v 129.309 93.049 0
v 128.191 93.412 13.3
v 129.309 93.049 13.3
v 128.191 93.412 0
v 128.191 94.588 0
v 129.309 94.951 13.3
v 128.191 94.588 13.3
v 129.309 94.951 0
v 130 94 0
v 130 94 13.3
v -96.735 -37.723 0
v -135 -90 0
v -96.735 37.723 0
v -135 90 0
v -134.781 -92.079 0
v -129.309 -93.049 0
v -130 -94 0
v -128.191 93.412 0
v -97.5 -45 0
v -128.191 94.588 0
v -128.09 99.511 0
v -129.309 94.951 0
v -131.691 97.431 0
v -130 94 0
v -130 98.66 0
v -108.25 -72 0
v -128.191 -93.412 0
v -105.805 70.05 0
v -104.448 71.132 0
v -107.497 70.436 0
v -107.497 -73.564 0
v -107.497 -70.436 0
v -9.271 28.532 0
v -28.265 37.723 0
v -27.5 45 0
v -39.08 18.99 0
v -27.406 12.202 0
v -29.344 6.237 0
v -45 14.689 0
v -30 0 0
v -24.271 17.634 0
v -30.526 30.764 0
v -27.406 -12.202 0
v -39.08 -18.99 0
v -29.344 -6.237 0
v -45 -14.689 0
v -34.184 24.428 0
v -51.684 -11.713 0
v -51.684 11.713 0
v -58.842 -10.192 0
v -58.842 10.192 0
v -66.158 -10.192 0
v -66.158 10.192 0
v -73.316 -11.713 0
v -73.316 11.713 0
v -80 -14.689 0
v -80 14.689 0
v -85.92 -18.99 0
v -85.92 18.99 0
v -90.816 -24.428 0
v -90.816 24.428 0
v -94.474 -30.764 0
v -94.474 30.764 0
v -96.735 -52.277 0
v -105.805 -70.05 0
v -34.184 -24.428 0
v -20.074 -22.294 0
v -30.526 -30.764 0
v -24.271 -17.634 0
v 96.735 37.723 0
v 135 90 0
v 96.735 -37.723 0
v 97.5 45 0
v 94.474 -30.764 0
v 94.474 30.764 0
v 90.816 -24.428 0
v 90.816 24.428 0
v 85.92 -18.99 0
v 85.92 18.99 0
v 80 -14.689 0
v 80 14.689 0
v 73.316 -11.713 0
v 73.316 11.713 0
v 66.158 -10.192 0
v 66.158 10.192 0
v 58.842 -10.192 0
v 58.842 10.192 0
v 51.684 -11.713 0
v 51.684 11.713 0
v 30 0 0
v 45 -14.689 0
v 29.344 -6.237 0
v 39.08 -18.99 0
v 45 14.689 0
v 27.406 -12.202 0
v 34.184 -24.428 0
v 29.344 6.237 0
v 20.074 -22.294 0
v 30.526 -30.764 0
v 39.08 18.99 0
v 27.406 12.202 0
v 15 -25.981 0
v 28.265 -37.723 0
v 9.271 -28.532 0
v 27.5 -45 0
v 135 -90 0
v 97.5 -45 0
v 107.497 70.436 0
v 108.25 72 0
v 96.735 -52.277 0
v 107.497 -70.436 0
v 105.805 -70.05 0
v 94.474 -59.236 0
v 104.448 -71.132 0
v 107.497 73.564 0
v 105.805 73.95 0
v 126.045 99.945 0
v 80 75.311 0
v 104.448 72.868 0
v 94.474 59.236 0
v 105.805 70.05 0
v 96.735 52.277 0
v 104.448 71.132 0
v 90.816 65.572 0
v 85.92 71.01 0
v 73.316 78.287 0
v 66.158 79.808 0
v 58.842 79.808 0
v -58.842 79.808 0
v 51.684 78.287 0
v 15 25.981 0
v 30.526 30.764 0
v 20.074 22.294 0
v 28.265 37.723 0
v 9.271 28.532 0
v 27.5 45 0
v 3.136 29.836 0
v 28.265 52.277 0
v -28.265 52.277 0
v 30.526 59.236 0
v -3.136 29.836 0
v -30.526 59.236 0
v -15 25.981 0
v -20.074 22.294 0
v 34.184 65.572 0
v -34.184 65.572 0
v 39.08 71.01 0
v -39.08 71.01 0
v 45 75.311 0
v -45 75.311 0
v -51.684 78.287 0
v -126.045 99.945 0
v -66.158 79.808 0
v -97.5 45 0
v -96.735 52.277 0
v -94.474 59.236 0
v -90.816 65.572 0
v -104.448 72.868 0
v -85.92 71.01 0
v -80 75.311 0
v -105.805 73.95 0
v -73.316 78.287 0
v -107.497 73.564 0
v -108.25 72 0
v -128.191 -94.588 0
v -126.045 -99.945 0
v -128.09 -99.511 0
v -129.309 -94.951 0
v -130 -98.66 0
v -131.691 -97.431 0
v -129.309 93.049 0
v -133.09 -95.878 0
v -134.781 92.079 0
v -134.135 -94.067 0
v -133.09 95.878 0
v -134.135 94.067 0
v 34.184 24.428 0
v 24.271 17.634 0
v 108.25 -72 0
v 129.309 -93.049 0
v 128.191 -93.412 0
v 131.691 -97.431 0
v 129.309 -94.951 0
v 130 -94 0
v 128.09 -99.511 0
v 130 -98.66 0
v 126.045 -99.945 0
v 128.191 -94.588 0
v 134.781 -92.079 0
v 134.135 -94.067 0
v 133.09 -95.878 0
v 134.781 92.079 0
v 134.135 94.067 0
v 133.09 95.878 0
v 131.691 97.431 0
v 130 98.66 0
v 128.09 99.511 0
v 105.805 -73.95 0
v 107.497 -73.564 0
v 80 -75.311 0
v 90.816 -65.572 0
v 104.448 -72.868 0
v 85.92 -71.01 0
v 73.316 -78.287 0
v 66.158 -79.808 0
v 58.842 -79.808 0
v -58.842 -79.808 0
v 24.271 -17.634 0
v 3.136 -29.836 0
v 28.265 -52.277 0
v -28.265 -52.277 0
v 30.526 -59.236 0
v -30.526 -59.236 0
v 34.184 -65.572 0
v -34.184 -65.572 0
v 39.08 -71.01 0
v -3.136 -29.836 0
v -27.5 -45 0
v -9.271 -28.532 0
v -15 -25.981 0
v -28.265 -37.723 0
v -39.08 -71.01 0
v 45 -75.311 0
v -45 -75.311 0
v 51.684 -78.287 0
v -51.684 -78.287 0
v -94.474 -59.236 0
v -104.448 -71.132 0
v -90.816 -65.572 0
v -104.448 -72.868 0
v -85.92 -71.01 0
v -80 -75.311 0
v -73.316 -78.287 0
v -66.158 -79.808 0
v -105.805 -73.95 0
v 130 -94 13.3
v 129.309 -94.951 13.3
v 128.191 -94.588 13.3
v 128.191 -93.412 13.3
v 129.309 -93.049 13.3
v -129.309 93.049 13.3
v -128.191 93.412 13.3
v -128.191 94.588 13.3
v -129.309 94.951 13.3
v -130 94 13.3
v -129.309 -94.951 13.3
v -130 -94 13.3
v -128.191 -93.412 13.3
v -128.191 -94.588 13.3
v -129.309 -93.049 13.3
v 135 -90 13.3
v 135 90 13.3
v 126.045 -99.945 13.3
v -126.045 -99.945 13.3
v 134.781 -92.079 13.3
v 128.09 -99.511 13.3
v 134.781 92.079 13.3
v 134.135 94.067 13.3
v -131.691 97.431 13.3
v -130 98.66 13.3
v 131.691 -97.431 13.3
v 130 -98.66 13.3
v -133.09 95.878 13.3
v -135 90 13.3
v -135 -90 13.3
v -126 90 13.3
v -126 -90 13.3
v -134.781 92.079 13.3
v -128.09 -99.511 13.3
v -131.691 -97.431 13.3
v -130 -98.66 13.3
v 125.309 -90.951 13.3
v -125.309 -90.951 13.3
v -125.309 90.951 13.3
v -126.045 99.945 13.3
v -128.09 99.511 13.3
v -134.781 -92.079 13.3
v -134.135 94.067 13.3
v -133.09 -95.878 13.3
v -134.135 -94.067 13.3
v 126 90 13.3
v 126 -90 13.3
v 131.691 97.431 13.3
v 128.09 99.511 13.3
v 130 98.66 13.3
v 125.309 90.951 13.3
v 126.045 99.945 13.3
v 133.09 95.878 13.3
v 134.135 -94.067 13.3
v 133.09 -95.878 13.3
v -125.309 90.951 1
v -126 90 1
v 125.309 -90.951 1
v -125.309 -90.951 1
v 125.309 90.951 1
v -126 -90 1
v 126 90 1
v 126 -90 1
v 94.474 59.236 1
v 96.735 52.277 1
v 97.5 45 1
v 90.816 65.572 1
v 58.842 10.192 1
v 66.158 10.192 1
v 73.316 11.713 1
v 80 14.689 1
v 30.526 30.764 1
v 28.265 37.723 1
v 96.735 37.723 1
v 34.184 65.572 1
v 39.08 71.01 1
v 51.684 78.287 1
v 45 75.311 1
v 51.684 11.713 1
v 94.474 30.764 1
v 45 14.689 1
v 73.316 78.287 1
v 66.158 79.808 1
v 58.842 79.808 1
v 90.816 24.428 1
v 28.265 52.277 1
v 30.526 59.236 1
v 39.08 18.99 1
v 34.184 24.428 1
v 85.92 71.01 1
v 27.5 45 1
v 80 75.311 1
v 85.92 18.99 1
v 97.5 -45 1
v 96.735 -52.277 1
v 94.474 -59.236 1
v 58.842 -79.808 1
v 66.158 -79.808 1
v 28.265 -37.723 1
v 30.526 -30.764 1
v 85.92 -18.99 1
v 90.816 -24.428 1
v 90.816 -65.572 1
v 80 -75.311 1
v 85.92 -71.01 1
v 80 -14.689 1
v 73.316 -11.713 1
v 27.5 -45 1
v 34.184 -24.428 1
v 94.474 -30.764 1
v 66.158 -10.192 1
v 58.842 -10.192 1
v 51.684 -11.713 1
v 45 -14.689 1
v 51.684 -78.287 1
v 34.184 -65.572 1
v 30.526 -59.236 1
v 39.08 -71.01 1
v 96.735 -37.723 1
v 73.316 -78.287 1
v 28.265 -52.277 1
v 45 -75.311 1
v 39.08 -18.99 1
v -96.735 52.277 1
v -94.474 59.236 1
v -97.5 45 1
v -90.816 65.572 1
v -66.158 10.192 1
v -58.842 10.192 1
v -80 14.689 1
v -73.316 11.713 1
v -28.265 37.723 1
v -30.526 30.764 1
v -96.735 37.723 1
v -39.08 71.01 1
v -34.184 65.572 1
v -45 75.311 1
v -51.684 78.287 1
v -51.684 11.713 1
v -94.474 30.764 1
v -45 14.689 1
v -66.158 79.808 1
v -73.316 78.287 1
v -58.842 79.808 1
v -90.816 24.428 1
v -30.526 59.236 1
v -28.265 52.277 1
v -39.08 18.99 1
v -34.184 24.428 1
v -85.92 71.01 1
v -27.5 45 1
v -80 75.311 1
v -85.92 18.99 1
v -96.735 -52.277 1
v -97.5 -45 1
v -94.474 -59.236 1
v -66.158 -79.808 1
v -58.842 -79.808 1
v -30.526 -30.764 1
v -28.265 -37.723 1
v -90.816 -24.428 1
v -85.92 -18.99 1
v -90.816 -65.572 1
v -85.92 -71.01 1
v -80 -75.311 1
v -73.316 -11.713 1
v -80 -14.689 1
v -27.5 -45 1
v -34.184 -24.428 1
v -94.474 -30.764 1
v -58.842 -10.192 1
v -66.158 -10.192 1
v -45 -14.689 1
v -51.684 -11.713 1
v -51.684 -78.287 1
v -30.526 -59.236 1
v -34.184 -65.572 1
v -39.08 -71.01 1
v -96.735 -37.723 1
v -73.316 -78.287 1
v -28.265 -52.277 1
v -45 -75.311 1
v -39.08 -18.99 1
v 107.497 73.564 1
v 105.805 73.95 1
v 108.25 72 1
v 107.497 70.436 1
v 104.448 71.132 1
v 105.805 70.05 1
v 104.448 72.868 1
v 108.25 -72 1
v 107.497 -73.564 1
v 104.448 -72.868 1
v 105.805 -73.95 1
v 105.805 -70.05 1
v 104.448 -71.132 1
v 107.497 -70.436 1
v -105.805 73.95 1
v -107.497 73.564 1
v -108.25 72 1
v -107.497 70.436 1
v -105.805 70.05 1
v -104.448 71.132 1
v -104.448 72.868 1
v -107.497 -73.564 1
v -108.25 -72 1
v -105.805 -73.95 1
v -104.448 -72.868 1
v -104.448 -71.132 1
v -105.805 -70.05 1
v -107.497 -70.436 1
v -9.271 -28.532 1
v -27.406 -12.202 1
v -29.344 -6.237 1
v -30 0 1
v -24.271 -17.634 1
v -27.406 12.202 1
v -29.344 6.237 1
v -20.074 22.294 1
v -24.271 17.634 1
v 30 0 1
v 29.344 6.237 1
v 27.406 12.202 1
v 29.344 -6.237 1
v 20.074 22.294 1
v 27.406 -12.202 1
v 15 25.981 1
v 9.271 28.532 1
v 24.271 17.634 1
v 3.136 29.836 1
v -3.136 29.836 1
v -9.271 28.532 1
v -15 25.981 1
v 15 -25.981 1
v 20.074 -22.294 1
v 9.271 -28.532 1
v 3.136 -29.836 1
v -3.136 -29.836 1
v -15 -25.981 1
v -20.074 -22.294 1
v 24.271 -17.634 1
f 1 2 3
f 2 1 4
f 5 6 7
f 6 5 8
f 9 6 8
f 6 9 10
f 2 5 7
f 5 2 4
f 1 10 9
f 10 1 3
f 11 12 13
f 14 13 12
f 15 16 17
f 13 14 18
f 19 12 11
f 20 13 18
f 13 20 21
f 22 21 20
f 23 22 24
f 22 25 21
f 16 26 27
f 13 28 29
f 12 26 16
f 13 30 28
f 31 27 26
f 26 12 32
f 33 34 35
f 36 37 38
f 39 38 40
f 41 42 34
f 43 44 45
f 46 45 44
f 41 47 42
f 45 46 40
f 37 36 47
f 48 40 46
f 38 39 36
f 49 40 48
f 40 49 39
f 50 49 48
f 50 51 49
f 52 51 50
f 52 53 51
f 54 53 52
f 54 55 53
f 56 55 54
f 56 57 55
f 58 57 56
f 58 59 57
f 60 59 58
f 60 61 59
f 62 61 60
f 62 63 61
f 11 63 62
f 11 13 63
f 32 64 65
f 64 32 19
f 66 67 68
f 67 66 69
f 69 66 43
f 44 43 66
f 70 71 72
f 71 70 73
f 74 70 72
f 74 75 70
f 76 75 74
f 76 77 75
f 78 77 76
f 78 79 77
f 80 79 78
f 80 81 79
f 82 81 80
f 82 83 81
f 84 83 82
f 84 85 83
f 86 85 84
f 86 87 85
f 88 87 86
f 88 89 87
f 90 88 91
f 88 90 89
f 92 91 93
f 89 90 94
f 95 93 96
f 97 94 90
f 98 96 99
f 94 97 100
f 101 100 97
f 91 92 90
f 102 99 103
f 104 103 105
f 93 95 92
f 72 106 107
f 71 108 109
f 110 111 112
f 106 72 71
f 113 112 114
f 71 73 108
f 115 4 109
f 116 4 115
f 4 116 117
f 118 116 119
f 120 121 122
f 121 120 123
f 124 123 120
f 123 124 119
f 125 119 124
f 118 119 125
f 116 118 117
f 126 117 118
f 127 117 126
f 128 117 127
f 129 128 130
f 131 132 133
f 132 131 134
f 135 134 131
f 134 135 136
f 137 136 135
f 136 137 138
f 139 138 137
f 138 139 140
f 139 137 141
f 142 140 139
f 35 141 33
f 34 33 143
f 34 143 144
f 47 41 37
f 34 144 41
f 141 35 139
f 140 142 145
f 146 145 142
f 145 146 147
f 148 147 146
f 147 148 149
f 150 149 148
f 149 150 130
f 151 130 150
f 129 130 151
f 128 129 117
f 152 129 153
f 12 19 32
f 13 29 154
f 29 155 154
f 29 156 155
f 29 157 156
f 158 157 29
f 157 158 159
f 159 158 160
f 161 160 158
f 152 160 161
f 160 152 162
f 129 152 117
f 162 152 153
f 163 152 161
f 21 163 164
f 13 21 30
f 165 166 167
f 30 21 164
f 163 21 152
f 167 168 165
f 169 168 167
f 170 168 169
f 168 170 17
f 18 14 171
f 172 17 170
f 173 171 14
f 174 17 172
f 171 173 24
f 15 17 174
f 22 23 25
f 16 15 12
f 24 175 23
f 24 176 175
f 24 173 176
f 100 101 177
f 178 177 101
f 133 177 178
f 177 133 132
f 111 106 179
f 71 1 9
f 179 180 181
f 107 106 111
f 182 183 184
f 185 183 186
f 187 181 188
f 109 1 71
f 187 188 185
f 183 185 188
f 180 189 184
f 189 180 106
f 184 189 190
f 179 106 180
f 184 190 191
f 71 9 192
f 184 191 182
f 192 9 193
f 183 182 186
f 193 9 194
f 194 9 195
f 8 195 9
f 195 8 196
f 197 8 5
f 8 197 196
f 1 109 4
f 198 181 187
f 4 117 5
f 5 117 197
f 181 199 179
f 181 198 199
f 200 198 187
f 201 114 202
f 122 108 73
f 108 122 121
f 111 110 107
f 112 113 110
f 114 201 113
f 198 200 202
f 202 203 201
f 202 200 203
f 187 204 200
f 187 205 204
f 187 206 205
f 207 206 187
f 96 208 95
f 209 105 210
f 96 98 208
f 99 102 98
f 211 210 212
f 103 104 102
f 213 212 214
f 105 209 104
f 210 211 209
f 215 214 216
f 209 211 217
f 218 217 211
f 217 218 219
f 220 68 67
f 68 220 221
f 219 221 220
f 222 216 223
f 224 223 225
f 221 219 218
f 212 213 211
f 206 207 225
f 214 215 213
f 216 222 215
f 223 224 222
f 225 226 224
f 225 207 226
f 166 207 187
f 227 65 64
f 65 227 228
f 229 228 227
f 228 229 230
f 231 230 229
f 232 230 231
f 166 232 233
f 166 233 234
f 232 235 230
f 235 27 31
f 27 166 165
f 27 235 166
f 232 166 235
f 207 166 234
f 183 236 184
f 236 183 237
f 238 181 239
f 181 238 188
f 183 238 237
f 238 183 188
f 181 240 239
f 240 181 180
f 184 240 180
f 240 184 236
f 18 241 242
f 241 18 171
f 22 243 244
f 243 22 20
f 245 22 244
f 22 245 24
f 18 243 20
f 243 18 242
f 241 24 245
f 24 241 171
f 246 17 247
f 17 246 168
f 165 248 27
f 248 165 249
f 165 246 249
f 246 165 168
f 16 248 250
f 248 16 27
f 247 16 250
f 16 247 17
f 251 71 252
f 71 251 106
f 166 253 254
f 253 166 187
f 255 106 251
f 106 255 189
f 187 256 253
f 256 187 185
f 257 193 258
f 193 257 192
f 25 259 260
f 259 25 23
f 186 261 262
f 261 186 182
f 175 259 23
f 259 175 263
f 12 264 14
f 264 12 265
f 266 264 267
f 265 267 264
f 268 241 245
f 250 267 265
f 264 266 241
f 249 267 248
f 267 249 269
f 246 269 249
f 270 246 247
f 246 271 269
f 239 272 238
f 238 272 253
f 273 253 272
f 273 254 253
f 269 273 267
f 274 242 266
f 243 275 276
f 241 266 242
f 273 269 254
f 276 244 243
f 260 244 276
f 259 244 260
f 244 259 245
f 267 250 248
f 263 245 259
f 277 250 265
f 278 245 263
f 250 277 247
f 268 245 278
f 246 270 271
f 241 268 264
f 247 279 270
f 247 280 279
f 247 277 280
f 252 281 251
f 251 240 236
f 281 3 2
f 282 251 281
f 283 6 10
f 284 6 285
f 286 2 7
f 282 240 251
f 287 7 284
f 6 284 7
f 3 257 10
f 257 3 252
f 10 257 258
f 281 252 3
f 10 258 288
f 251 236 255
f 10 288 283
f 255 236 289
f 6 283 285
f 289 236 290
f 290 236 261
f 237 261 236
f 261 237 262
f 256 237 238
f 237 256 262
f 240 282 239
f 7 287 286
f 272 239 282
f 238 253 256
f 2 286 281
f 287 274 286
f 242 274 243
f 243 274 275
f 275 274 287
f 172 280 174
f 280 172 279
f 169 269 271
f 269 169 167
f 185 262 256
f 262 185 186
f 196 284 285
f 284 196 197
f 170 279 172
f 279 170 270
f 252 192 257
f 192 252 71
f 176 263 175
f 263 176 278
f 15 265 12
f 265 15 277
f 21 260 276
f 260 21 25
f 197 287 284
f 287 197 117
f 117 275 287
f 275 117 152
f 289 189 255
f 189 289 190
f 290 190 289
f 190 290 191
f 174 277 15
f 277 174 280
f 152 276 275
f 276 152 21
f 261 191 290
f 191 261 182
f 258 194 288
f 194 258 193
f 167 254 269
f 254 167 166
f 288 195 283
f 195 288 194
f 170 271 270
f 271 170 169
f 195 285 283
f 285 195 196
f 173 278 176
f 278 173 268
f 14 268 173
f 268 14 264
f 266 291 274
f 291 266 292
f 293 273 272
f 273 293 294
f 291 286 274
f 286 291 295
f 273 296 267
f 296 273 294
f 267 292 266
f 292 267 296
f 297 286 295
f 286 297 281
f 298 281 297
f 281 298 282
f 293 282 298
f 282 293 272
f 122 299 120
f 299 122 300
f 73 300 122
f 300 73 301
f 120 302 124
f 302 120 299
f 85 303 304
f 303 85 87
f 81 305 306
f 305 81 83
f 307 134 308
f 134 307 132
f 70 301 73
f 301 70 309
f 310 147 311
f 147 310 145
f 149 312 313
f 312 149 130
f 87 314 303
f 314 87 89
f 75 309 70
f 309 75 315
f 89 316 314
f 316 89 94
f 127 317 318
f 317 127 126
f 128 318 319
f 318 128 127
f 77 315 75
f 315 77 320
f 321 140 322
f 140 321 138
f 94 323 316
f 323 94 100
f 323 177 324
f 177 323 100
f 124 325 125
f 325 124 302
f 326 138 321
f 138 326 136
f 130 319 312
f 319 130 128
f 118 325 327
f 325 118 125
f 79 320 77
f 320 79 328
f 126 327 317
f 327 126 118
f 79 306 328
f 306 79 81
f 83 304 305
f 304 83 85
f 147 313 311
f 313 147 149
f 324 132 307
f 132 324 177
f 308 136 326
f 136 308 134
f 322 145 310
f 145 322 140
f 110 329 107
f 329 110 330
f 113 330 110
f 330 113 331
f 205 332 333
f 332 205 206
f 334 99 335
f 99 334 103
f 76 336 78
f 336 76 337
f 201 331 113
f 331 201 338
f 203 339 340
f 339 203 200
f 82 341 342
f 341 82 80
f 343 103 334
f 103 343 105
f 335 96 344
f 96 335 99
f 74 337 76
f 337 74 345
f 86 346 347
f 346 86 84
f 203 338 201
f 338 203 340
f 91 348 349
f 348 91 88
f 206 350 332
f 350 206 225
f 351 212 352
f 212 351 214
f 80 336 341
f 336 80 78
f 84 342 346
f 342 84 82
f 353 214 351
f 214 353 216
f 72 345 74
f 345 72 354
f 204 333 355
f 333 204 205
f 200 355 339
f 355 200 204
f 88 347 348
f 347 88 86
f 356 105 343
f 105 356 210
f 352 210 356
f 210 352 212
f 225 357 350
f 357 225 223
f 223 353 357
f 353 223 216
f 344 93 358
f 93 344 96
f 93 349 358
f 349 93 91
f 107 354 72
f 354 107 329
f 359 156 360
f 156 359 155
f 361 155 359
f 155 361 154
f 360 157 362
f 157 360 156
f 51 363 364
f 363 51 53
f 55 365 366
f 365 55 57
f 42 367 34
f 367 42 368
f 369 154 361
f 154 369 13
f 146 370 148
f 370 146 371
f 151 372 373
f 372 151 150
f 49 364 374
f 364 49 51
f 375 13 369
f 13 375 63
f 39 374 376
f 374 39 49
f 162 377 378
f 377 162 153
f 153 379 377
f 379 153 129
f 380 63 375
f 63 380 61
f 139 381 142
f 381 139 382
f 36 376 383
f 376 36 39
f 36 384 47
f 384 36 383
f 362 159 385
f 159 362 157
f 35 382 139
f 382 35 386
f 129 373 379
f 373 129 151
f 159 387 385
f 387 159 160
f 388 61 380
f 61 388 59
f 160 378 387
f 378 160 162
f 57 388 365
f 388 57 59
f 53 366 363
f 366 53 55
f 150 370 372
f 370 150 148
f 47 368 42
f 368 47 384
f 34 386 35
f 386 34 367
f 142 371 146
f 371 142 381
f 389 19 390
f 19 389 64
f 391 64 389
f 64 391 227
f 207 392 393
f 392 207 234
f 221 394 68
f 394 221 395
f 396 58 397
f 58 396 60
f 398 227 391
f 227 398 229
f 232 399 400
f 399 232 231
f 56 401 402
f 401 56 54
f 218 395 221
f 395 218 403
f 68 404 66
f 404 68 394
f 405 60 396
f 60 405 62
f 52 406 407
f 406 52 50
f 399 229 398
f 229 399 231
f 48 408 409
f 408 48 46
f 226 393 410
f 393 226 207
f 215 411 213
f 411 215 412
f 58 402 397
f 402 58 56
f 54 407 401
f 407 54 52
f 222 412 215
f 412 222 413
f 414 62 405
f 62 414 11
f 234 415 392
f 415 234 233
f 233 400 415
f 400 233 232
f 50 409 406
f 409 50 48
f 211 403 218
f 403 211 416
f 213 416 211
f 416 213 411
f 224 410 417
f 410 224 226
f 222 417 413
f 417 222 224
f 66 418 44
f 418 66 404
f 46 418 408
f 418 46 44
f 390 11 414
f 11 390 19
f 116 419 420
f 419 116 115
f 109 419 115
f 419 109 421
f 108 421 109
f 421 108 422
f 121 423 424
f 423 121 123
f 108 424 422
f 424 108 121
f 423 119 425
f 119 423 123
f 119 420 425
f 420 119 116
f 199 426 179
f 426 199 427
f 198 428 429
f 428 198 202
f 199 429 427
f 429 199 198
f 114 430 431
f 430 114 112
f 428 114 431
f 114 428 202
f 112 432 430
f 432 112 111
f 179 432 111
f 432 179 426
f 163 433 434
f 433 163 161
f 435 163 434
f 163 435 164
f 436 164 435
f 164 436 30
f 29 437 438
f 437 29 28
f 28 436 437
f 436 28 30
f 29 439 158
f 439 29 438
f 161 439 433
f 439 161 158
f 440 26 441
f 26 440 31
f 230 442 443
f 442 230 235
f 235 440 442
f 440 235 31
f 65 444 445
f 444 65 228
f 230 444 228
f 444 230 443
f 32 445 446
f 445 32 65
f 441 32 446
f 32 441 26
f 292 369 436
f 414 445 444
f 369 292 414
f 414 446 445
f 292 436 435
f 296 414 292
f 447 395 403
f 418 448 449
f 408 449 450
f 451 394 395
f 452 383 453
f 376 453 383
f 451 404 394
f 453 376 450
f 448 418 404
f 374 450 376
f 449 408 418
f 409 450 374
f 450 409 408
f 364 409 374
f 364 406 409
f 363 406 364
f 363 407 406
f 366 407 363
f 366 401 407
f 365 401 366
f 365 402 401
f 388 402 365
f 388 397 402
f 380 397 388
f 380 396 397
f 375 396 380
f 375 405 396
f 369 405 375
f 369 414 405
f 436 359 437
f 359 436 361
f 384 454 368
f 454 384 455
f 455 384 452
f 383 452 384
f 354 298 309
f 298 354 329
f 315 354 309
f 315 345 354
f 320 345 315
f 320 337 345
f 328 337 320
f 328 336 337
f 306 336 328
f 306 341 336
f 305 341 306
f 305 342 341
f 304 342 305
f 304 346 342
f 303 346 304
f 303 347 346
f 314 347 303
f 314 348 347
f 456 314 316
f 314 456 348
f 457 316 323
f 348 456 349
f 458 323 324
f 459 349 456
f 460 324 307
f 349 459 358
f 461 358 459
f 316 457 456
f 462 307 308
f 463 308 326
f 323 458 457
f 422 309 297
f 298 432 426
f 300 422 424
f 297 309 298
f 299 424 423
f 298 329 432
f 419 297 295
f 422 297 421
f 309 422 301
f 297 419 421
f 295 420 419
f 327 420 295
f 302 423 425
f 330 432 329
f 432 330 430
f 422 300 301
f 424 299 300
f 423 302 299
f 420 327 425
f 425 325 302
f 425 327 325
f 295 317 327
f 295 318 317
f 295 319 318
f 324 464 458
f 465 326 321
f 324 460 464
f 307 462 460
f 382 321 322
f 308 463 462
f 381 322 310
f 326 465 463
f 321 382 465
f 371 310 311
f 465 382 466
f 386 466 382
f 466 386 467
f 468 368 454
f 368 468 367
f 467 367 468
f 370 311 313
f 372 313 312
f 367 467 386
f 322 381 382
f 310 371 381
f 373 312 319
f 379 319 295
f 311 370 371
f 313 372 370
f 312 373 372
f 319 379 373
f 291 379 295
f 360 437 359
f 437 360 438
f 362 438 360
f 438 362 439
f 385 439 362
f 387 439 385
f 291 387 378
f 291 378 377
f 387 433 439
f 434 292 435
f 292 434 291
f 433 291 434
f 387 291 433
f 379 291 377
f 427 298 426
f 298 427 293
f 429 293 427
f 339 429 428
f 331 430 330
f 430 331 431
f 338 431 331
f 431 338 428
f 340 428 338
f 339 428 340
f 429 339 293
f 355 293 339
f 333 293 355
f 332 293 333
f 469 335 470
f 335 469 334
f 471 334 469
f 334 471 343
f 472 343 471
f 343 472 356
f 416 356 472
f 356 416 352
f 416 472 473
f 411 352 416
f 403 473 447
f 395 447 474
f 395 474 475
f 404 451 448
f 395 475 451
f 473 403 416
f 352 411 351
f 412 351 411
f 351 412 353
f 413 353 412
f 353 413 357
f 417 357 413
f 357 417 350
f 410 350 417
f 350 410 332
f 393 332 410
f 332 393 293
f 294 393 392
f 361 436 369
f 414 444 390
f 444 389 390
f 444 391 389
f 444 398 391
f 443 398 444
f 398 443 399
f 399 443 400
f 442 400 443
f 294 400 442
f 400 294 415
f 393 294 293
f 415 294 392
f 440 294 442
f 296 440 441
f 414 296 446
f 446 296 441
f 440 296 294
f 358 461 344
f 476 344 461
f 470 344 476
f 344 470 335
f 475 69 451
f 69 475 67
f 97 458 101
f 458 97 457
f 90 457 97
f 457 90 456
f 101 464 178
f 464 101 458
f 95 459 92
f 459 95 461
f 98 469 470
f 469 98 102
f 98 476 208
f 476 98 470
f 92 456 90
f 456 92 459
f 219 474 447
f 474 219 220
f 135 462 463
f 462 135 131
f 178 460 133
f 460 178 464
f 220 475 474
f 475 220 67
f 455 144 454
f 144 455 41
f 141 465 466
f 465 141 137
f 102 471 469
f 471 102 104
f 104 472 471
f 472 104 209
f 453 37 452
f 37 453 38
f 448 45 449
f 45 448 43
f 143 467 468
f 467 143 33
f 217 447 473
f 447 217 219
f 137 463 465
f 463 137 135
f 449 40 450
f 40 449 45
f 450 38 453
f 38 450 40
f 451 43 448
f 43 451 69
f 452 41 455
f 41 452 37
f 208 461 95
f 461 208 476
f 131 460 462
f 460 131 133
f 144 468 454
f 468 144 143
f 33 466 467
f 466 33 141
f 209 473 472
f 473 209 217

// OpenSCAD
dim_x = 245+5;

dim_y = 175+5;

dim_z = 8.3+5;

module copy_mirror(vec=[0,1,0])
{
    children();
    mirror(vec) children();
}

module quadcopy()
{
    copy_mirror([1,0,0]) copy_mirror() children();
}



difference(){
hull(){
quadcopy(){
translate([dim_x/2,dim_y/2,0]) cylinder(r=10,h=dim_z);
}

}

hull(){
quadcopy(){
translate([dim_x/2,dim_y/2,0]) cylinder(r=1,h=dim_z);
}
}

quadcopy(){
#translate([dim_x/2+4,dim_y/2+4,0]) cylinder(r=1,h=30);
}


}


difference(){
hull(){
quadcopy(){
translate([dim_x/2,dim_y/2,0]) cylinder(r=1,h=1);
}

}

cylinder(r=30,h=3);

quadcopy(){
#translate([dim_x/4,dim_y/4,0]) cylinder(r=35,h=3);



}

quadcopy(){
#translate([0.85*dim_x/2,0.8*dim_y/2,0]) cylinder(r=2,h=3);



}


}
